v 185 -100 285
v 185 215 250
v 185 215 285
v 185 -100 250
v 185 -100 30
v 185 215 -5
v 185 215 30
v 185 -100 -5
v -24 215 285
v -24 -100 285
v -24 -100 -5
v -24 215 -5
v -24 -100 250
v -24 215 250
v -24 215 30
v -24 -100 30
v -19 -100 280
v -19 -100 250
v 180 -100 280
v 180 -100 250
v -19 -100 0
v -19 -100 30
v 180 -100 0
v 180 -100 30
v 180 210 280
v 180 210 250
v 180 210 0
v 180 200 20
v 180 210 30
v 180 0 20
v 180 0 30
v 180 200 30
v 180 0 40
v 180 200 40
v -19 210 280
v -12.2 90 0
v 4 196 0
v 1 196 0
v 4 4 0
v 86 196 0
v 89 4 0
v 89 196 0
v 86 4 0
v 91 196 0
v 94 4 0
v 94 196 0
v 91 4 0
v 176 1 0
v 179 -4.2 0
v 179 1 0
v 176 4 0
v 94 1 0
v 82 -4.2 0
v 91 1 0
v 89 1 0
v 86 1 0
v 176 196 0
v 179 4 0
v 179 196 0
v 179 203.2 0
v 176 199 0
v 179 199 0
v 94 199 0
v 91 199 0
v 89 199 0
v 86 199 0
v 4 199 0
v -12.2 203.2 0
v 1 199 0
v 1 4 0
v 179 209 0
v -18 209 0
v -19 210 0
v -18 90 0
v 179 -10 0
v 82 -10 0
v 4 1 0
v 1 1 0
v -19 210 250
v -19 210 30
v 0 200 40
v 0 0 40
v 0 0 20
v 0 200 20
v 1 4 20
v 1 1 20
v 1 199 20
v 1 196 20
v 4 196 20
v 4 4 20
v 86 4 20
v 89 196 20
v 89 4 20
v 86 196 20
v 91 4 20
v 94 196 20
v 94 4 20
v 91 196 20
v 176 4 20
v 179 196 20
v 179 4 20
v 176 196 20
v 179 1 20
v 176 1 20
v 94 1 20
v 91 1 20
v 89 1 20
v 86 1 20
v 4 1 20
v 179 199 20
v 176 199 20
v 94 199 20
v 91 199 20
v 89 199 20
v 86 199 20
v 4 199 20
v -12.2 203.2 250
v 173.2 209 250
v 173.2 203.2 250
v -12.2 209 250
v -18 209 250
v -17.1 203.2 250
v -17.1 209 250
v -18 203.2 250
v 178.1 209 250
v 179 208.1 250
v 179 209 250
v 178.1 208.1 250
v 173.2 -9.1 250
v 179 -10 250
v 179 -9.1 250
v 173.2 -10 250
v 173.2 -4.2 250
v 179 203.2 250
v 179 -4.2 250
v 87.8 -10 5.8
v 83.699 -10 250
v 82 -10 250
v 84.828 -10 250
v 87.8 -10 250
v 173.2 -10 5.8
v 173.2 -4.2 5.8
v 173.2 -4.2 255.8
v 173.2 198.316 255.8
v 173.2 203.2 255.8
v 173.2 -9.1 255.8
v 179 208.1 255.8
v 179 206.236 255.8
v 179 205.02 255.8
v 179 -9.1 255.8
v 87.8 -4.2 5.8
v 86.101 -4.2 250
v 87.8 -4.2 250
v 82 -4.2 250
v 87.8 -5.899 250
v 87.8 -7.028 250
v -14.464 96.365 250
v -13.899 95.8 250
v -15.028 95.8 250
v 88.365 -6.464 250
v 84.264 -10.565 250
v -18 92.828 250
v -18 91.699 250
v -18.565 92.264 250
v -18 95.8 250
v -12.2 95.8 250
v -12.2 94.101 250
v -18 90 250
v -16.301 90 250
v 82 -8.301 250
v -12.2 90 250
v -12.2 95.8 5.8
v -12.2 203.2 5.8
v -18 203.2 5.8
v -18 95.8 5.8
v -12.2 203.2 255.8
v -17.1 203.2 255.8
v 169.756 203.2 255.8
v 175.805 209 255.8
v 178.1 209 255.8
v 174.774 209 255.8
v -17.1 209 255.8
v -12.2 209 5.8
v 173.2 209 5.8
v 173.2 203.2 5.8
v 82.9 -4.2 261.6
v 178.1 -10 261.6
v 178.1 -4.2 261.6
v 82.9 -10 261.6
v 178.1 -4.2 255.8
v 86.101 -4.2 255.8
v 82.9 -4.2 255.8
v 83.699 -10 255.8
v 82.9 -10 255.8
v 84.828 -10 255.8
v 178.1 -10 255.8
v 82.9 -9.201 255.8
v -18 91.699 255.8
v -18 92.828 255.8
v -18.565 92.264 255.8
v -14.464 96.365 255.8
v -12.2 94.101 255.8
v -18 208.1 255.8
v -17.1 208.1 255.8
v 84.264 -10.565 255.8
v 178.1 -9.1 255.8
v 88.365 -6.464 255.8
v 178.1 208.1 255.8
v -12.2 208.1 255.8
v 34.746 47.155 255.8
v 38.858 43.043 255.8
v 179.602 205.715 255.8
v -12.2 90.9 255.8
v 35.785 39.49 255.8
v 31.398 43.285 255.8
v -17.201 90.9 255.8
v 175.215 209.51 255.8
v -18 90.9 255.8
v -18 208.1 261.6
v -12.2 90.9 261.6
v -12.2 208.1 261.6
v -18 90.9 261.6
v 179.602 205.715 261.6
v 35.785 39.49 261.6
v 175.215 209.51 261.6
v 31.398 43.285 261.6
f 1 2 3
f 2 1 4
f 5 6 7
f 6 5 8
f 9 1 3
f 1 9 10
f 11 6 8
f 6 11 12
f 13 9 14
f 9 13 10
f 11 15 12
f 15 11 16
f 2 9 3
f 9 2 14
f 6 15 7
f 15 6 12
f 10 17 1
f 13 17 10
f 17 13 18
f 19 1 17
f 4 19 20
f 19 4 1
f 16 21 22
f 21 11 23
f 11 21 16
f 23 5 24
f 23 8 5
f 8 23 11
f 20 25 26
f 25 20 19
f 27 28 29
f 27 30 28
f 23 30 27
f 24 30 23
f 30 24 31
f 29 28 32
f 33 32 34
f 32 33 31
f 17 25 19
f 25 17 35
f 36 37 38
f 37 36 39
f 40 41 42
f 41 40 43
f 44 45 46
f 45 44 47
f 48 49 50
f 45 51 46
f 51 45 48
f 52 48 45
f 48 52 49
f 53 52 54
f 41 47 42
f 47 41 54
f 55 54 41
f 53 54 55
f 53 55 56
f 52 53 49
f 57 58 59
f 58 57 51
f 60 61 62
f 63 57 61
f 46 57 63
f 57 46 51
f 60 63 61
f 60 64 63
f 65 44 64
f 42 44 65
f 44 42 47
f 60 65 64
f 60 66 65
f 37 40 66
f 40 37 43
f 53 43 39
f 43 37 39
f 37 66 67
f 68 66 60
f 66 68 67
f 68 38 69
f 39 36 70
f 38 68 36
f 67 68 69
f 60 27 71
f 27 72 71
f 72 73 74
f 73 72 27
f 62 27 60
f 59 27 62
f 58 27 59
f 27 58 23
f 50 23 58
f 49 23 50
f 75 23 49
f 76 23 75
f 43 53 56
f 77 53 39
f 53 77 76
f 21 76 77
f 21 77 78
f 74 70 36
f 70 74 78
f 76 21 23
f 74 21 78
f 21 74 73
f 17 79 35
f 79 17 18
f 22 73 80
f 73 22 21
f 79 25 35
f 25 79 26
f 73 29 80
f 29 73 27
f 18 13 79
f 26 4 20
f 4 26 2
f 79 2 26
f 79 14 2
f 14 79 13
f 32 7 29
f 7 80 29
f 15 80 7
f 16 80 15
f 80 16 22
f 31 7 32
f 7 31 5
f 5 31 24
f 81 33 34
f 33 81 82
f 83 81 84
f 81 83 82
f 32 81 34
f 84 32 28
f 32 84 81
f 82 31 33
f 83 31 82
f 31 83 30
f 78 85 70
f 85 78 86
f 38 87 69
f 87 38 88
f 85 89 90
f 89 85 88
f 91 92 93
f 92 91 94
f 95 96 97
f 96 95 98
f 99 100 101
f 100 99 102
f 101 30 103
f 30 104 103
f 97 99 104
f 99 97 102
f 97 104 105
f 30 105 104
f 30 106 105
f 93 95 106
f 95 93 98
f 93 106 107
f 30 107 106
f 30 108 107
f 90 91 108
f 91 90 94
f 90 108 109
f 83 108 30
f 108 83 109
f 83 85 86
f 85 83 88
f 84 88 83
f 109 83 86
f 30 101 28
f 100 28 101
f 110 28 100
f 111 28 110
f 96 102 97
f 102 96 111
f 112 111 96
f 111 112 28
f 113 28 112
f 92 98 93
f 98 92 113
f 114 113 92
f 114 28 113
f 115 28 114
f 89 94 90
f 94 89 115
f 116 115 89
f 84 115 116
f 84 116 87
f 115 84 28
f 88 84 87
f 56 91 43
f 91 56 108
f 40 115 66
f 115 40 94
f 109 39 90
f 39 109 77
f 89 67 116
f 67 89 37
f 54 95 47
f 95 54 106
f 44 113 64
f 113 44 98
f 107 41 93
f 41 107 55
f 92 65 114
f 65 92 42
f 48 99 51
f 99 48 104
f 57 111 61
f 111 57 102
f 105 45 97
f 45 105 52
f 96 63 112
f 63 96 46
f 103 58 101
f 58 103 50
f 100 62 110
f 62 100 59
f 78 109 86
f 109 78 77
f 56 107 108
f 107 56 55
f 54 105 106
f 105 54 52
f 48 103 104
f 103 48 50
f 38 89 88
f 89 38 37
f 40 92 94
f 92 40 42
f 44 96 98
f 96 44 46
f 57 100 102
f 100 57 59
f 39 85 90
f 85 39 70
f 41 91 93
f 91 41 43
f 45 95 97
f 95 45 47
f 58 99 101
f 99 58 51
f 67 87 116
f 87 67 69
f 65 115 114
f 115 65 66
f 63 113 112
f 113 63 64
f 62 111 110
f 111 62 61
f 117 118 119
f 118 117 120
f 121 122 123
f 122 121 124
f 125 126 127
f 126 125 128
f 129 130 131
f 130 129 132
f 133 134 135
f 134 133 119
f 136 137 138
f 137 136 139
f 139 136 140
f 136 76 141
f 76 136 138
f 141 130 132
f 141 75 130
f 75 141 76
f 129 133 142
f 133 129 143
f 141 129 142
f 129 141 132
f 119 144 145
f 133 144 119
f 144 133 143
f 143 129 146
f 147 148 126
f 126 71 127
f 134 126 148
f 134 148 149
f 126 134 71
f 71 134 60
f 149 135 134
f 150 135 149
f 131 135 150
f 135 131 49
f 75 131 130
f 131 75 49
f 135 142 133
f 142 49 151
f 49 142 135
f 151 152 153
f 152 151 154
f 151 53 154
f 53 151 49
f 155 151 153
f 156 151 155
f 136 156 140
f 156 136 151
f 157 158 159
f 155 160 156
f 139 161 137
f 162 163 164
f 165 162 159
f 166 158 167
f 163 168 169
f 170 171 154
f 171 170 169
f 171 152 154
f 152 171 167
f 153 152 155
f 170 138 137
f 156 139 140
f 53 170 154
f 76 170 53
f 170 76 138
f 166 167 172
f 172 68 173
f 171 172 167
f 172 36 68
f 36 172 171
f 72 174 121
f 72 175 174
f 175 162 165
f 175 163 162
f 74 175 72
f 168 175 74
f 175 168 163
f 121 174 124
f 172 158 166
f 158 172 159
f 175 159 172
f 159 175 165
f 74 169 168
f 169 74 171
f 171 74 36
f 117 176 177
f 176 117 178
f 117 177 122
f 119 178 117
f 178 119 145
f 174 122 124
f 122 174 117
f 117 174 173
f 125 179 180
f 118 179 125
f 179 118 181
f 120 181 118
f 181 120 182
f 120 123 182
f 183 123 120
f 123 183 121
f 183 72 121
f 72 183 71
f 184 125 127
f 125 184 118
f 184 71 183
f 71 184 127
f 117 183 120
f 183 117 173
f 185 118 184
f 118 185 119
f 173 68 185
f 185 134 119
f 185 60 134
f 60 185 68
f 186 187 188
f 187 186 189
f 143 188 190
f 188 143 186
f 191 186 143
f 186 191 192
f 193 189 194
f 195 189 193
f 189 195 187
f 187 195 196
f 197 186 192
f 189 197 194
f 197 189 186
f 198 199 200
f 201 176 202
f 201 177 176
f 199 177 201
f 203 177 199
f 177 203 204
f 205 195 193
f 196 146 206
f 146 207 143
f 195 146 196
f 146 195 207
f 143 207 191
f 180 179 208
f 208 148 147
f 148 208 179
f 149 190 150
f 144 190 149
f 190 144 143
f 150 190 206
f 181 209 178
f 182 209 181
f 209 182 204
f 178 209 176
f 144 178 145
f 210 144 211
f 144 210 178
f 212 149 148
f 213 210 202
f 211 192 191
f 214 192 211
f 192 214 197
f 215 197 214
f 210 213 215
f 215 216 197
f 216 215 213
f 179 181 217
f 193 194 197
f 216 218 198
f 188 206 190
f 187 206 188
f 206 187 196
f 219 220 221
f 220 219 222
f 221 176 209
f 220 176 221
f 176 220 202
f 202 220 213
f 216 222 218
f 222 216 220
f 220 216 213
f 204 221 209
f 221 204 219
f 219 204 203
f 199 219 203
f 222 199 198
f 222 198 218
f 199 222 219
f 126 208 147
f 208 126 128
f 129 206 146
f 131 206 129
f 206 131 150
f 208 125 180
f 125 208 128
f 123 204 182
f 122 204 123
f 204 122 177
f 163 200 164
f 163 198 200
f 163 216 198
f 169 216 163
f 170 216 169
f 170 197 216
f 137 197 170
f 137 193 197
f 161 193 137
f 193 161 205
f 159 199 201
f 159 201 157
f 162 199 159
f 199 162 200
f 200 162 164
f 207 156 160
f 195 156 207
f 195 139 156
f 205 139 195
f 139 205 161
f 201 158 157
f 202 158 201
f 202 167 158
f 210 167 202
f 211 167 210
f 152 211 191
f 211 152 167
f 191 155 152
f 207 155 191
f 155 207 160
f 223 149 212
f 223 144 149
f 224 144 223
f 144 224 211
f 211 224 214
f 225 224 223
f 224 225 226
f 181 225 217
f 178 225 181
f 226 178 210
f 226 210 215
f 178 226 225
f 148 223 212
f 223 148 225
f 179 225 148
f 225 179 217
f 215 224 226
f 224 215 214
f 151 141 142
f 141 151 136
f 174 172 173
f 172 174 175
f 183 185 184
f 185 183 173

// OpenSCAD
// room size
w = 199;
h = 280;

module room() {
    color([0.8, 0.8, 0.8]) render(convexity=2) difference() {
        translate([180-w-5, -100, -5]) cube([w+10, 210+5+100, h+10]);
        translate([180-w, -100, 0]) cube([w, 210+100, h]);
        
        translate([180-w-5, -100, 30]) cube([w+10, 210+5+100, h-60]);
    }
}

module bed() {
    color([0.8, 0.5, 0.5]) render(convexity=2) difference()
    {
        cube([180, 200, 40]);

        translate([  0, 0, 0]) cube([  1, 200, 20]);
        translate([  4, 0, 0]) cube([ 82, 200, 20]);
        translate([ 89, 0, 0]) cube([  2, 200, 20]);
        translate([ 94, 0, 0]) cube([ 82, 200, 20]);
        translate([179, 0, 0]) cube([  1, 200, 20]);

        translate([0,   0, 0]) cube([180,   1, 20]);
        translate([0,   4, 0]) cube([180, 192, 20]);
        translate([0, 199, 0]) cube([180,   1, 20]);
    }
}

// outside coordinates for frame
x1 = 179;
y1 = -10;
x2 = 181-w;
y2 = 209;

// left indent
li = 100;

// right indent
ri = 100;

// anchor point
px = x2+70;
py = y1+70;
pz = 250;

module framex() {
    color("#aa9988") {
        translate([x1-5, y1,   0]) cube([5, 5, 200]);
        translate([x1-5, y2-5, 0]) cube([5, 5, 200]);
        translate([x2,   y2-5, 0]) cube([5, 5, 200]);
        translate([x2,   y1+li,0]) cube([5, 5, 200]);

        
        translate([x2, y1+li, 120]) cube([5,y2-y1-li,5]);
        translate([x2, y1,    195]) cube([5,y2-y1,5]);

        translate([x1-5, y1, 120]) cube([5,y2-y1,5]);
        translate([x1-5, y1, 195]) cube([5,y2-y1,5]);

        translate([x2, y2-5, 120]) cube([x1-x2,5,5]);
        translate([x2, y2-5, 195]) cube([x1-x2,5,5]);
    }
    
    color("#aaccaa") {
        translate([x2+1, y2-20-1, 125]) cube([x1-x2-2,20,1]);
        translate([x2+1, y2-80-1, 200]) cube([x1-x2-2,80,1]);
    }
}

module frame() {
    module batten58(t, r) {
        translate(t) rotate(r) cube([5.8, 5.8, 250]);
    }

    batten58([x1, y1], 90);
    batten58([x2+ri, y1], 0);
    batten58([x2, y1+li], 0);
    batten58([x2, y2], -90);
    batten58([x1, y2], 180);

    module battenhorz(p1, p2, h) {
        blen = pow(pow(p1[0]-p2[0], 2) + pow(p1[1]-p2[1], 2), 0.5);
        brot = 180-atan2(p1[0]-p2[0], p1[1]-p2[1]);
    
        translate([p1[0], p1[1], h]) rotate(brot)
            translate([-5.8/2, -2, 0]) cube([5.8, blen+4, 5.8]);
        echo("batten length", blen);
    }
    
    tp1 = [x2+ri+5.8/2, y1+5.8/2];
    tp2 = [x2+5.8/2, y1+li+5.8/2];

    battenhorz([x1-5.8/2, y1+5.8/2], tp1, 250+5.8);
    battenhorz([x2+5.8/2, y2-5.8/2], tp2, 250+5.8);
    battenhorz([x1-5.8/2, y1+5.8/2], [x1-5.8/2, y2-5.8/2], 250);
    battenhorz([x2+5.8/2, y2-5.8/2], [x1-5.8/2, y2-5.8/2], 250);

    battenhorz(tp1, tp2, 250);
    battenhorz((tp1 + tp2) / 2, [x1-5.8/2, y2-5.8/2], 250+5.8);

    battenhorz([x1-5.8/2, y1+5.8/2], tp1, 0);
    battenhorz([x2+5.8/2, y2-5.8/2], tp2, 0);
    battenhorz([x2+5.8/2, y2-5.8/2], [x1-5.8/2, y2-5.8/2], 0);

}

room();
bed();
frame();
